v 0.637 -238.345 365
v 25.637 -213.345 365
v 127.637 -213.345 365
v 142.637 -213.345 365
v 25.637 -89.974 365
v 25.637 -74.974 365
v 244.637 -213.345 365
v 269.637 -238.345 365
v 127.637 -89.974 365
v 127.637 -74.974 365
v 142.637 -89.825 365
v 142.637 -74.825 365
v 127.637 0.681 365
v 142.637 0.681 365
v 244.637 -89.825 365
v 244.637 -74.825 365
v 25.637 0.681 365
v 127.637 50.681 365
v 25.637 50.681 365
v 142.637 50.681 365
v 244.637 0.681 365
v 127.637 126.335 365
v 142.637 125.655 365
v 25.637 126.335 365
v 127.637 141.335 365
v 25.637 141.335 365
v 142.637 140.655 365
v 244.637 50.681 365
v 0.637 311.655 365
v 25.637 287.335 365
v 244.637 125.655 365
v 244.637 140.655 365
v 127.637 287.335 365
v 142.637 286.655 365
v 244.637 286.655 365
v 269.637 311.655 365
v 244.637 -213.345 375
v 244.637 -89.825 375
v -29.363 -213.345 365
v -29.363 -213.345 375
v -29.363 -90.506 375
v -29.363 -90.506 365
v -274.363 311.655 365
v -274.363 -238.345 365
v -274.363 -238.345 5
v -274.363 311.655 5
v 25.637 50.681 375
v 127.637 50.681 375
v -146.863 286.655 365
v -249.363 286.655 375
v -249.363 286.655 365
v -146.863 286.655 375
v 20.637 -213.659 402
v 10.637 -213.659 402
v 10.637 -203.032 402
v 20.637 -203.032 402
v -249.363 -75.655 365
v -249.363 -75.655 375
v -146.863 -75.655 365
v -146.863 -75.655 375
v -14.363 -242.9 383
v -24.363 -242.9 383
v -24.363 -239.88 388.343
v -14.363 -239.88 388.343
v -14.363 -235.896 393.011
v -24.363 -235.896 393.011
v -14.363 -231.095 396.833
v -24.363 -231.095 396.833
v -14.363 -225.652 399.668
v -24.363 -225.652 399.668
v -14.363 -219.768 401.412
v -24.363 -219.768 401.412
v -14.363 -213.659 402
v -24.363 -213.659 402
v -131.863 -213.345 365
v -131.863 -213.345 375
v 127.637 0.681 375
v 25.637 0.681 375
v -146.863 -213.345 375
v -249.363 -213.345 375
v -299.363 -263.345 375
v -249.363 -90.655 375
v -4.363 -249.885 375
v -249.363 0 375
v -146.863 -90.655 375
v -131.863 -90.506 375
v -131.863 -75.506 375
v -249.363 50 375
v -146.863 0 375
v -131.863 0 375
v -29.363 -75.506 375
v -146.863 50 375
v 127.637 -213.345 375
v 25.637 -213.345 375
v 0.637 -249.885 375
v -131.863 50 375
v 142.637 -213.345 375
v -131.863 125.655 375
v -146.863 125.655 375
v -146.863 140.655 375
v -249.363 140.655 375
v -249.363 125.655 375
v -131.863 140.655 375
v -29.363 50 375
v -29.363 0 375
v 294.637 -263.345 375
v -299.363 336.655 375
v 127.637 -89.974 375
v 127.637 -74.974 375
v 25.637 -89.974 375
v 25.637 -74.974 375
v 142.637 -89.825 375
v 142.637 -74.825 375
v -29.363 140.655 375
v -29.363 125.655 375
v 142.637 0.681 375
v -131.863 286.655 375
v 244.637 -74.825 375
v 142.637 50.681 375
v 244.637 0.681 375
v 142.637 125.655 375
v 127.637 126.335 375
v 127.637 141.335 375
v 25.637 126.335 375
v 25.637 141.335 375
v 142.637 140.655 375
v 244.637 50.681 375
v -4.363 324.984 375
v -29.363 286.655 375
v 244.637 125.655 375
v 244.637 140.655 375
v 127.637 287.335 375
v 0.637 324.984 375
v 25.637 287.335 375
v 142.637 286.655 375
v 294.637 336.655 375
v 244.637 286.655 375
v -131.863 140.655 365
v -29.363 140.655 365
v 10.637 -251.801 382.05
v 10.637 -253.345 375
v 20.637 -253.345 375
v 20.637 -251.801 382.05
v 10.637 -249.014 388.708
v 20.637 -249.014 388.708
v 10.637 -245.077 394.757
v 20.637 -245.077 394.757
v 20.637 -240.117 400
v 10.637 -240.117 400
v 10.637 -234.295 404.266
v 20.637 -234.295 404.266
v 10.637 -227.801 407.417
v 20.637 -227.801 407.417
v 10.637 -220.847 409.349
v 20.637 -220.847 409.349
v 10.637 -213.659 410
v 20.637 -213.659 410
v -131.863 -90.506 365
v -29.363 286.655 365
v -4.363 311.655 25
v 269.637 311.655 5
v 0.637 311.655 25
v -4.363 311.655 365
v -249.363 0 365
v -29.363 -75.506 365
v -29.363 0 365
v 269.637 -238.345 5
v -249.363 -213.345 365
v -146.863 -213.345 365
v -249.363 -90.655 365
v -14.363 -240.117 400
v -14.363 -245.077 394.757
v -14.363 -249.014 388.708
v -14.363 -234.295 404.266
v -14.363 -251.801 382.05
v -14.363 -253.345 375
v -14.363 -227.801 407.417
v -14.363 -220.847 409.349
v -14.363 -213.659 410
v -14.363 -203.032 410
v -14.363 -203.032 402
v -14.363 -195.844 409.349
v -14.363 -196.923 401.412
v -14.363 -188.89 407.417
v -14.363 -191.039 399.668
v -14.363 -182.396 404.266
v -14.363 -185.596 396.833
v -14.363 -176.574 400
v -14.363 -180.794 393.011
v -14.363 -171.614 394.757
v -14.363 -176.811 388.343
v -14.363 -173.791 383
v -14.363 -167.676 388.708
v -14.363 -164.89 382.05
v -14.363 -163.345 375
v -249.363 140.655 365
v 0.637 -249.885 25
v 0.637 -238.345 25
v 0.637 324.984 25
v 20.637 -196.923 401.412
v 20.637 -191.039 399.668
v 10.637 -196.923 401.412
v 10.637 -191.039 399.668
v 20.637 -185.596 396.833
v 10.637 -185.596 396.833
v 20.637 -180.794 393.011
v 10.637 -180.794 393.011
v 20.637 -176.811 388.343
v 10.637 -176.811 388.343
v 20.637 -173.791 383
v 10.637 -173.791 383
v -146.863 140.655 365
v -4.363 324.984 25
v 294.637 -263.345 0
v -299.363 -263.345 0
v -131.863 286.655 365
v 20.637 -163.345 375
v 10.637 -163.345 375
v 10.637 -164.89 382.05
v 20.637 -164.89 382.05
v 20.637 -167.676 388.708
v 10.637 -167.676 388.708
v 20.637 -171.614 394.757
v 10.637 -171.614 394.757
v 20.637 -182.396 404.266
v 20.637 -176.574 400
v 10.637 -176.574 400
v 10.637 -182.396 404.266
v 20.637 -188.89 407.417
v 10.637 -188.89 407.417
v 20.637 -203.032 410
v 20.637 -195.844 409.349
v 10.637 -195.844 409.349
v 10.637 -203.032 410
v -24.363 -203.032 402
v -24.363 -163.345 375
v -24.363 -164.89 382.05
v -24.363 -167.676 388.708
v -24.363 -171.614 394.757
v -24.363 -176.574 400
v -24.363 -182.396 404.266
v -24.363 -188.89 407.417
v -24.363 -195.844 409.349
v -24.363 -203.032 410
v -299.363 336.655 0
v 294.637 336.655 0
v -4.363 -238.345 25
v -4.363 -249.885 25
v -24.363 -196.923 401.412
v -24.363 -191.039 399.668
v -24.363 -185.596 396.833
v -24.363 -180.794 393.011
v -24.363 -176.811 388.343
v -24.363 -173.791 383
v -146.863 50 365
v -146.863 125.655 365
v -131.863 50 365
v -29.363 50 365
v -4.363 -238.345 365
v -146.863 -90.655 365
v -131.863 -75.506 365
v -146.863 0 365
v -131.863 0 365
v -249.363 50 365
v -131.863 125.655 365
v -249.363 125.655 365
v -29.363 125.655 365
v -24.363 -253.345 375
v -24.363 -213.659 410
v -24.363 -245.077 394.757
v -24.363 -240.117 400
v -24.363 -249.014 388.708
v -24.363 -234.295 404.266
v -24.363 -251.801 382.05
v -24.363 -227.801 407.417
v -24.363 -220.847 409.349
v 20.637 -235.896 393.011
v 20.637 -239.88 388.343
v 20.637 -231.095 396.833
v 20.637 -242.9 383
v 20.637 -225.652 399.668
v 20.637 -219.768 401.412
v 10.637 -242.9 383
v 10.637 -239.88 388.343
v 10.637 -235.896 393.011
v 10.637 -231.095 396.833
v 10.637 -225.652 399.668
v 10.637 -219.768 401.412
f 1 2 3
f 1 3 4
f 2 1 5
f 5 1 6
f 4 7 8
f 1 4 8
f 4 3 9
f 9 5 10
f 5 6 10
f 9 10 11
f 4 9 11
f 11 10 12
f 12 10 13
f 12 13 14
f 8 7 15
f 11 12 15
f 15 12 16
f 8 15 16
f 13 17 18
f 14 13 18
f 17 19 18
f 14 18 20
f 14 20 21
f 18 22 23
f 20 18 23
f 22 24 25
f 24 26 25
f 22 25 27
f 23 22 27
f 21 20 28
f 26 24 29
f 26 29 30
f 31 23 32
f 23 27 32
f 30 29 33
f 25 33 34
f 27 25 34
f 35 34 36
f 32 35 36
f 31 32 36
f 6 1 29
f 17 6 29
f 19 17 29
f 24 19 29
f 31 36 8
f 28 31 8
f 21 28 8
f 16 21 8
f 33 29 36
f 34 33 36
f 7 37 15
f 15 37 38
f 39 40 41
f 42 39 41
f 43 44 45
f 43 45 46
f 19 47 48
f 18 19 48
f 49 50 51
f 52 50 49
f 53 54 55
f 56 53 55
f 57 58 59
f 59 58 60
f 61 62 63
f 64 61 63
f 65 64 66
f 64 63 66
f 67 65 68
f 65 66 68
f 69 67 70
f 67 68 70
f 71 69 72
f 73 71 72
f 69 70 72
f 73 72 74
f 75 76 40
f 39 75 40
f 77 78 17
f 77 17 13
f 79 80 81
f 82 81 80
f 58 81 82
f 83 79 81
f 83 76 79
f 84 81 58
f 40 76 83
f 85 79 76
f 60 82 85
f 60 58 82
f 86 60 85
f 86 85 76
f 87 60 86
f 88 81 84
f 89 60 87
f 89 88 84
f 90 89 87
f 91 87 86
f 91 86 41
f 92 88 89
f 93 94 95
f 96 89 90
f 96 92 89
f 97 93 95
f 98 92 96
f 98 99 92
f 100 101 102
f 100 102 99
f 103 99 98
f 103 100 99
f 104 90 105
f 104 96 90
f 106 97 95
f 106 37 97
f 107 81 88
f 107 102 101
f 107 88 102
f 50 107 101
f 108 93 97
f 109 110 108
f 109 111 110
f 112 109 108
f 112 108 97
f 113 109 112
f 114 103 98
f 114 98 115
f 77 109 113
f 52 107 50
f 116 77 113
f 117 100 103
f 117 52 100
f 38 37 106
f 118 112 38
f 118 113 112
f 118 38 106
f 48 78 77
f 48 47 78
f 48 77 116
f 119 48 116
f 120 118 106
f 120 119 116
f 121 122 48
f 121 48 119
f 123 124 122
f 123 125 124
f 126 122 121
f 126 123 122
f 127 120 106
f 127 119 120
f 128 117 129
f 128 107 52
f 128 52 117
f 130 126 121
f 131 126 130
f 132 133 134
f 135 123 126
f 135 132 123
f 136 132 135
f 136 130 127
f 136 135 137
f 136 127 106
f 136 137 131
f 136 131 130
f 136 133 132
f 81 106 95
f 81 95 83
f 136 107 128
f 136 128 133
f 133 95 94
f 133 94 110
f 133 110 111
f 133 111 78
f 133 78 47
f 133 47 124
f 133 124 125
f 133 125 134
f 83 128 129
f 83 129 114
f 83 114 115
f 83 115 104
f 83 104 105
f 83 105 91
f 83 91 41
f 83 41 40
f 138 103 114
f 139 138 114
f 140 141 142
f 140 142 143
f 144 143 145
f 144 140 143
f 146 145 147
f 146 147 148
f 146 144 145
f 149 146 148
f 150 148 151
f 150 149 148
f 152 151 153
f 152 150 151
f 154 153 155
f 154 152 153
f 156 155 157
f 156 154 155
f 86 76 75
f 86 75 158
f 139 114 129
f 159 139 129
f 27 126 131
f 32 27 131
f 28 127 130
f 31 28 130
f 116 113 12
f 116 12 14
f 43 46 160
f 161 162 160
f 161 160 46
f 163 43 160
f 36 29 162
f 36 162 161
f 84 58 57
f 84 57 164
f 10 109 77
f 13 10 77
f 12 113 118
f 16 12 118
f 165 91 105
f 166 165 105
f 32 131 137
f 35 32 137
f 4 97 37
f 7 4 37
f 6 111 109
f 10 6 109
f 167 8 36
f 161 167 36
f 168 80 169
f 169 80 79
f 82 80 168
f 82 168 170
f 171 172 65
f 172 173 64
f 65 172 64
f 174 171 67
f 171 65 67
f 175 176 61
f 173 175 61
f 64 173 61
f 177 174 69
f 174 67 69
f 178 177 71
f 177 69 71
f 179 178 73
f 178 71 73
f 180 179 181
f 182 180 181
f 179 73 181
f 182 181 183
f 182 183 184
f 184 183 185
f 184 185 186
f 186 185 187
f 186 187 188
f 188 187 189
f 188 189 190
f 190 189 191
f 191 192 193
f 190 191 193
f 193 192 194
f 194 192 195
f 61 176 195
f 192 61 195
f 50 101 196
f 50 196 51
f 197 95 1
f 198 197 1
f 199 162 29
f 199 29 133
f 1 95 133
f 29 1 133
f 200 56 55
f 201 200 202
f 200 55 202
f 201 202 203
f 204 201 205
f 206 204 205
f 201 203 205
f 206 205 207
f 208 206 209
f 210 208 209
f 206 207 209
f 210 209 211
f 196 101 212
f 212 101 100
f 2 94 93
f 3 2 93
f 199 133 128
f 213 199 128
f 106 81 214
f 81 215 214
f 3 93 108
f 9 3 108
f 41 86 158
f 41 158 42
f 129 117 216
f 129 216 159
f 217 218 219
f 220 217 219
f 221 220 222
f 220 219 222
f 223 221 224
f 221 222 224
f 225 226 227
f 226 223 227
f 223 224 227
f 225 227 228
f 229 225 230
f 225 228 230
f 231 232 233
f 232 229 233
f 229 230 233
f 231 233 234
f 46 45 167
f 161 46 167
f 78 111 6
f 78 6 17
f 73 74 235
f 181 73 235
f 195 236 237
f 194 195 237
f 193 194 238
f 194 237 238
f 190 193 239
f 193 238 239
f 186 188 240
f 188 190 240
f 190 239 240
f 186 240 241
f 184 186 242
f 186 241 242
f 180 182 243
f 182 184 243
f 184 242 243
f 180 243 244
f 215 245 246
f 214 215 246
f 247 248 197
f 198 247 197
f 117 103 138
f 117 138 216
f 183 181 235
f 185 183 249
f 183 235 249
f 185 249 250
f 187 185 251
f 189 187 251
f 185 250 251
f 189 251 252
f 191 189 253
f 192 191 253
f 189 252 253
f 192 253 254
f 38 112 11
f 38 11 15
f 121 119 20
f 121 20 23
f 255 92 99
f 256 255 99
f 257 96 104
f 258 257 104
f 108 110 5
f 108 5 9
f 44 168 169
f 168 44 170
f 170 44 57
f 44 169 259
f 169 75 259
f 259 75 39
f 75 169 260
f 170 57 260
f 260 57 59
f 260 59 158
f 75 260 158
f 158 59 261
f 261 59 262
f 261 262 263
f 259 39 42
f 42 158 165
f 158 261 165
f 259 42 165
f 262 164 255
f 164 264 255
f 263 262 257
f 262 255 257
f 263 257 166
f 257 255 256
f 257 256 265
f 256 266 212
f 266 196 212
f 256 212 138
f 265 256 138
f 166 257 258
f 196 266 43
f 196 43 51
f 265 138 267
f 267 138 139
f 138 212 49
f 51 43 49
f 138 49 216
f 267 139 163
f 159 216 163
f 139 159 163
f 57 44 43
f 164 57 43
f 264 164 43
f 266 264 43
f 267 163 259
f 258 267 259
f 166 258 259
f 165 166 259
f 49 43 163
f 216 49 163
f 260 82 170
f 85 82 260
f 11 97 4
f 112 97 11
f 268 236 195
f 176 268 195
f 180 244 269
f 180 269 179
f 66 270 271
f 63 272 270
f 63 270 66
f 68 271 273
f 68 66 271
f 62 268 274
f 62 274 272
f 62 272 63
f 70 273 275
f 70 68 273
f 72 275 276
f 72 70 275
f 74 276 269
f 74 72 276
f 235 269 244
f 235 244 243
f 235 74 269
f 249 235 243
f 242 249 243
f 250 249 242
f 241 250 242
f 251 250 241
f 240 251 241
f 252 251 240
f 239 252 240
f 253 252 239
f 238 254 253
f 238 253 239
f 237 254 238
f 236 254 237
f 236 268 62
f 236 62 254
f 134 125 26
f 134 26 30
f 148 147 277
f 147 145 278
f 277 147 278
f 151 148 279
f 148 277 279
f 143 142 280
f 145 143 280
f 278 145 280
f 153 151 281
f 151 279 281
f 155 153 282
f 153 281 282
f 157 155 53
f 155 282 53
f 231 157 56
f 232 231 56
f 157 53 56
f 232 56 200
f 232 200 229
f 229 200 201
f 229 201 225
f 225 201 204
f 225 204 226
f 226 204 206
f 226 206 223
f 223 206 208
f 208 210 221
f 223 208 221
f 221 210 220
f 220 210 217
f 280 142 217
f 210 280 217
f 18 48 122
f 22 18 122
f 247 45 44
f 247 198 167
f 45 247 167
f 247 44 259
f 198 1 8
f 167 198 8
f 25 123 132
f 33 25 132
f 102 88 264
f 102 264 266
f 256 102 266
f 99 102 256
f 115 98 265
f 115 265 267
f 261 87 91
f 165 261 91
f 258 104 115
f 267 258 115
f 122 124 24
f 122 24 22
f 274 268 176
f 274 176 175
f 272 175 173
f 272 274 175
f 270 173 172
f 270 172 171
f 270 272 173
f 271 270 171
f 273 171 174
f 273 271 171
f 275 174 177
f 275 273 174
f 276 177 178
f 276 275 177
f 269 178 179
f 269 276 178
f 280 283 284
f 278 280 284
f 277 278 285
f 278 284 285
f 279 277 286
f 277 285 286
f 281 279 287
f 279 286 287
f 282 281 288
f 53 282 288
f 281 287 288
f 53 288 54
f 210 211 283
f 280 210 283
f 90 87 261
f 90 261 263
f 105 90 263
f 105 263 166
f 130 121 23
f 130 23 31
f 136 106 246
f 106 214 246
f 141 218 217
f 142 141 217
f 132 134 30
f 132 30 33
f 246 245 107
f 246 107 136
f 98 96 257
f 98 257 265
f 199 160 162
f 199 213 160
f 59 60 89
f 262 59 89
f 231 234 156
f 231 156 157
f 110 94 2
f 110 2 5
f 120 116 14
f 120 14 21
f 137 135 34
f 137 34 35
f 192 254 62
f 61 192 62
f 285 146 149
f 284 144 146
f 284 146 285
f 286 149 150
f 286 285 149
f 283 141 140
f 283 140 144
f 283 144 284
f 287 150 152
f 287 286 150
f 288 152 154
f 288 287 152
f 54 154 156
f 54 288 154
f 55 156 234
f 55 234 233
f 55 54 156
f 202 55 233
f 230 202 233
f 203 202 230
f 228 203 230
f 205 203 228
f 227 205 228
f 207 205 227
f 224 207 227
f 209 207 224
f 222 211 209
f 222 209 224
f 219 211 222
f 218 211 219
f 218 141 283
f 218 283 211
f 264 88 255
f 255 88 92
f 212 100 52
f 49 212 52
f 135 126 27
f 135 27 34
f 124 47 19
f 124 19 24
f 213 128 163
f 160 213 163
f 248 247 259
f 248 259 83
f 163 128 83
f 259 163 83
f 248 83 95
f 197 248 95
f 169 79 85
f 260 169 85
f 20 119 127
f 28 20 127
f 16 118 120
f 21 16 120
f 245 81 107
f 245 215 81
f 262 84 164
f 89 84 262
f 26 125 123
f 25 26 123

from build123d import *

# Parameters (mm, degrees)
F0_W           = 594
F0_H           = 600
F1_DEPTH       = 365
F2_W           = 544.0000259457
F2_H           = 550.0000259457
F3_DEPTH       = 360
F4_W           = 594
F4_H           = 600
F4_W_2         = 544.0000259457
F4_H_2         = 550.0000259457
F5_DEPTH       = 10
F6_W           = 102.5
F6_H           = 146
F6_H_2         = 75.6546143503
F6_W_2         = 102
F6_H_3         = 74.9739574221
F6_H_4         = 75.5056260526
F6_H_5         = 123.5204165253
F6_H_6         = 123.3714282276
F6_H_7         = 122.8397595971
F6_H_8         = 122.6907712994
F7_DEPTH       = 350
F8_W           = 10
F8_H           = 90
F9_DEPTH       = 35
F10_T1_DEPTH   = 208.4313483298
F10_2_T1_DEPTH = 208.4313483298
F12_DEPTH      = 100


# Not quite as in the source:
# - a fillet or chamfer that OpenCascade refuses, or shapes differently, is made with other operations: its cross-section is extruded or revolved along the edge and cut away or added


with BuildPart() as f1:
    # F0 (on Top) → F1 (new body)
    with BuildSketch(Plane.XY):
        with Locations((-2.3632310331, 36.6546143503)):
            Rectangle(F0_W, F0_H)
    extrude(amount=F1_DEPTH)

    # F2 (on face) → F3 (cut)
    with BuildSketch(Plane.XY.offset(365)):
        with Locations((-2.3632310331, 36.6546143503)):
            Rectangle(F2_W, F2_H)
    extrude(amount=-F3_DEPTH, mode=Mode.SUBTRACT)

    # F4 (on face) → F5 (join)
    with BuildSketch(Plane.XY.offset(365)):
        with Locations((-2.3632310331, 36.6546143503)):
            Rectangle(F4_W, F4_H)
        with Locations((-2.3632310331, 36.6546143503)):
            Rectangle(F4_W_2, F4_H_2, mode=Mode.SUBTRACT)
        with Locations((-2.3632310331, 36.6546143503)):
            Rectangle(F4_W_2, F4_H_2)
    extrude(amount=F5_DEPTH)

    # F6 (on face) → F7 (cut)
    with BuildSketch(Plane.XY.offset(375)):
        with Locations((-198.1132310331, 213.6546143503)):
            Rectangle(F6_W, F6_H)
        with Locations((-80.6132310331, 213.6546143503)):
            Rectangle(F6_W, F6_H)
        with Locations((-80.6132310331, 87.8273071751)):
            Rectangle(F6_W, F6_H_2)
        with Locations((-198.1132310331, 87.8273071751)):
            Rectangle(F6_W, F6_H_2)
        with Locations((76.6367689669, 214.3352712785)):
            Rectangle(F6_W_2, F6_H)
        with Locations((193.6367689669, 213.6546143503)):
            Rectangle(F6_W_2, F6_H)
        with Locations((193.6367689669, 88.1676356392)):
            Rectangle(F6_W_2, F6_H_3)
        with Locations((76.6367689669, 88.5079641033)):
            Rectangle(F6_W_2, F6_H_2)
        with Locations((76.6367689669, -37.146650247)):
            Rectangle(F6_W_2, F6_H_2)
        with Locations((193.6367689669, -37.0721560981)):
            Rectangle(F6_W_2, F6_H_4)
        with Locations((193.6367689669, -151.5851773871)):
            Rectangle(F6_W_2, F6_H_5)
        with Locations((76.6367689669, -151.6596715359)):
            Rectangle(F6_W_2, F6_H_6)
        with Locations((-80.6132310331, -151.9255058512)):
            Rectangle(F6_W, F6_H_7)
        with Locations((-80.6132310331, -37.7528130263)):
            Rectangle(F6_W, F6_H_4)
        with Locations((-198.1132310331, -37.8273071751)):
            Rectangle(F6_W, F6_H_2)
        with Locations((-198.1132310331, -152)):
            Rectangle(F6_W, F6_H_8)
        Polygon((0.6367689669, -249.8852461576), (0.6367689669, 324.9841928482), (-4.3632310331, 324.9841928482), (-4.3632310331, -249.8852461576), (0, -249.8852461576), align=None)
    extrude(amount=-F7_DEPTH, mode=Mode.SUBTRACT)


with BuildPart() as f9:
    # F8 (on face) → F9 (new body)
    with BuildSketch(Plane.XY.offset(375)):
        with Locations((-19.3632310331, -208.3453856497)):
            Rectangle(F8_W, F8_H)
    extrude(amount=F9_DEPTH)

    # F10: fillet of radius 40 on 2 edges, made by hand

    # F10_s2 → F10_t1 (cut)
    with BuildSketch(Plane.YZ.offset(-123.578905198)):
        with BuildLine():
            ThreePointArc((-163.3453856497, 375), (-176.574142205, 400), (-203.0316553157, 410))
            Line((-203.0316553157, 410), (-163.3453856497, 410))
            Line((-163.3453856497, 410), (-163.3453856497, 375))
        make_face()
        with BuildLine():
            ThreePointArc((-253.3453856497, 375), (-240.1166290944, 400), (-213.6591159837, 410))
            Line((-213.6591159837, 410), (-253.3453856497, 410))
            Line((-253.3453856497, 410), (-253.3453856497, 375))
        make_face()
    extrude(amount=F10_T1_DEPTH, mode=Mode.SUBTRACT)


with BuildPart() as f9b:
    # F8 (on face) → F9, piece 2 (new body)
    with BuildSketch(Plane.XY.offset(375)):
        with Locations((15.6367689669, -208.3453856497)):
            Rectangle(F8_W, F8_H)
    extrude(amount=F9_DEPTH)

    # F10#2: fillet of radius 40 on 2 edges, made by hand

    # F10_2_s2 → F10_2_t1 (cut)
    with BuildSketch(Plane.YZ.offset(-88.578905198)):
        with BuildLine():
            ThreePointArc((-163.3453856497, 375), (-176.574142205, 400), (-203.0316553157, 410))
            Line((-203.0316553157, 410), (-163.3453856497, 410))
            Line((-163.3453856497, 410), (-163.3453856497, 375))
        make_face()
        with BuildLine():
            ThreePointArc((-253.3453856497, 375), (-240.1166290944, 400), (-213.6591159837, 410))
            Line((-213.6591159837, 410), (-253.3453856497, 410))
            Line((-253.3453856497, 410), (-253.3453856497, 375))
        make_face()
    extrude(amount=F10_2_T1_DEPTH, mode=Mode.SUBTRACT)


with BuildPart() as f12_tool:
    # F11 (on face) → F12 (new body)
    with BuildSketch(Plane(origin=(-24.3632310331, 0, 0), x_dir=(0, -1, 0), z_dir=(-1, 0, 0))):
        with BuildLine():
            ThreePointArc((242.8995144287, 382.9999899864), (231.094723675, 396.8328199283), (213.6591159837, 402.0000100136))
            Line((213.6591159837, 402.0000100136), (203.0316553157, 402.0000100136))
            ThreePointArc((203.0316553157, 402.0000100136), (185.5960476244, 396.8328199283), (173.7912568707, 382.9999899864))
            Line((173.7912568707, 382.9999899864), (242.8995144287, 382.9999899864))
        make_face()
    extrude(amount=-F12_DEPTH)


with BuildPart() as f9_1:
    add(f9.part)

    # F12: cut by f12_tool
    add(f12_tool.part, mode=Mode.SUBTRACT)


with BuildPart() as f9b_1:
    add(f9b.part)

    # F12: cut by f12_tool
    add(f12_tool.part, mode=Mode.SUBTRACT)


solid = Compound([f1.part, f9_1.part, f9b_1.part])
